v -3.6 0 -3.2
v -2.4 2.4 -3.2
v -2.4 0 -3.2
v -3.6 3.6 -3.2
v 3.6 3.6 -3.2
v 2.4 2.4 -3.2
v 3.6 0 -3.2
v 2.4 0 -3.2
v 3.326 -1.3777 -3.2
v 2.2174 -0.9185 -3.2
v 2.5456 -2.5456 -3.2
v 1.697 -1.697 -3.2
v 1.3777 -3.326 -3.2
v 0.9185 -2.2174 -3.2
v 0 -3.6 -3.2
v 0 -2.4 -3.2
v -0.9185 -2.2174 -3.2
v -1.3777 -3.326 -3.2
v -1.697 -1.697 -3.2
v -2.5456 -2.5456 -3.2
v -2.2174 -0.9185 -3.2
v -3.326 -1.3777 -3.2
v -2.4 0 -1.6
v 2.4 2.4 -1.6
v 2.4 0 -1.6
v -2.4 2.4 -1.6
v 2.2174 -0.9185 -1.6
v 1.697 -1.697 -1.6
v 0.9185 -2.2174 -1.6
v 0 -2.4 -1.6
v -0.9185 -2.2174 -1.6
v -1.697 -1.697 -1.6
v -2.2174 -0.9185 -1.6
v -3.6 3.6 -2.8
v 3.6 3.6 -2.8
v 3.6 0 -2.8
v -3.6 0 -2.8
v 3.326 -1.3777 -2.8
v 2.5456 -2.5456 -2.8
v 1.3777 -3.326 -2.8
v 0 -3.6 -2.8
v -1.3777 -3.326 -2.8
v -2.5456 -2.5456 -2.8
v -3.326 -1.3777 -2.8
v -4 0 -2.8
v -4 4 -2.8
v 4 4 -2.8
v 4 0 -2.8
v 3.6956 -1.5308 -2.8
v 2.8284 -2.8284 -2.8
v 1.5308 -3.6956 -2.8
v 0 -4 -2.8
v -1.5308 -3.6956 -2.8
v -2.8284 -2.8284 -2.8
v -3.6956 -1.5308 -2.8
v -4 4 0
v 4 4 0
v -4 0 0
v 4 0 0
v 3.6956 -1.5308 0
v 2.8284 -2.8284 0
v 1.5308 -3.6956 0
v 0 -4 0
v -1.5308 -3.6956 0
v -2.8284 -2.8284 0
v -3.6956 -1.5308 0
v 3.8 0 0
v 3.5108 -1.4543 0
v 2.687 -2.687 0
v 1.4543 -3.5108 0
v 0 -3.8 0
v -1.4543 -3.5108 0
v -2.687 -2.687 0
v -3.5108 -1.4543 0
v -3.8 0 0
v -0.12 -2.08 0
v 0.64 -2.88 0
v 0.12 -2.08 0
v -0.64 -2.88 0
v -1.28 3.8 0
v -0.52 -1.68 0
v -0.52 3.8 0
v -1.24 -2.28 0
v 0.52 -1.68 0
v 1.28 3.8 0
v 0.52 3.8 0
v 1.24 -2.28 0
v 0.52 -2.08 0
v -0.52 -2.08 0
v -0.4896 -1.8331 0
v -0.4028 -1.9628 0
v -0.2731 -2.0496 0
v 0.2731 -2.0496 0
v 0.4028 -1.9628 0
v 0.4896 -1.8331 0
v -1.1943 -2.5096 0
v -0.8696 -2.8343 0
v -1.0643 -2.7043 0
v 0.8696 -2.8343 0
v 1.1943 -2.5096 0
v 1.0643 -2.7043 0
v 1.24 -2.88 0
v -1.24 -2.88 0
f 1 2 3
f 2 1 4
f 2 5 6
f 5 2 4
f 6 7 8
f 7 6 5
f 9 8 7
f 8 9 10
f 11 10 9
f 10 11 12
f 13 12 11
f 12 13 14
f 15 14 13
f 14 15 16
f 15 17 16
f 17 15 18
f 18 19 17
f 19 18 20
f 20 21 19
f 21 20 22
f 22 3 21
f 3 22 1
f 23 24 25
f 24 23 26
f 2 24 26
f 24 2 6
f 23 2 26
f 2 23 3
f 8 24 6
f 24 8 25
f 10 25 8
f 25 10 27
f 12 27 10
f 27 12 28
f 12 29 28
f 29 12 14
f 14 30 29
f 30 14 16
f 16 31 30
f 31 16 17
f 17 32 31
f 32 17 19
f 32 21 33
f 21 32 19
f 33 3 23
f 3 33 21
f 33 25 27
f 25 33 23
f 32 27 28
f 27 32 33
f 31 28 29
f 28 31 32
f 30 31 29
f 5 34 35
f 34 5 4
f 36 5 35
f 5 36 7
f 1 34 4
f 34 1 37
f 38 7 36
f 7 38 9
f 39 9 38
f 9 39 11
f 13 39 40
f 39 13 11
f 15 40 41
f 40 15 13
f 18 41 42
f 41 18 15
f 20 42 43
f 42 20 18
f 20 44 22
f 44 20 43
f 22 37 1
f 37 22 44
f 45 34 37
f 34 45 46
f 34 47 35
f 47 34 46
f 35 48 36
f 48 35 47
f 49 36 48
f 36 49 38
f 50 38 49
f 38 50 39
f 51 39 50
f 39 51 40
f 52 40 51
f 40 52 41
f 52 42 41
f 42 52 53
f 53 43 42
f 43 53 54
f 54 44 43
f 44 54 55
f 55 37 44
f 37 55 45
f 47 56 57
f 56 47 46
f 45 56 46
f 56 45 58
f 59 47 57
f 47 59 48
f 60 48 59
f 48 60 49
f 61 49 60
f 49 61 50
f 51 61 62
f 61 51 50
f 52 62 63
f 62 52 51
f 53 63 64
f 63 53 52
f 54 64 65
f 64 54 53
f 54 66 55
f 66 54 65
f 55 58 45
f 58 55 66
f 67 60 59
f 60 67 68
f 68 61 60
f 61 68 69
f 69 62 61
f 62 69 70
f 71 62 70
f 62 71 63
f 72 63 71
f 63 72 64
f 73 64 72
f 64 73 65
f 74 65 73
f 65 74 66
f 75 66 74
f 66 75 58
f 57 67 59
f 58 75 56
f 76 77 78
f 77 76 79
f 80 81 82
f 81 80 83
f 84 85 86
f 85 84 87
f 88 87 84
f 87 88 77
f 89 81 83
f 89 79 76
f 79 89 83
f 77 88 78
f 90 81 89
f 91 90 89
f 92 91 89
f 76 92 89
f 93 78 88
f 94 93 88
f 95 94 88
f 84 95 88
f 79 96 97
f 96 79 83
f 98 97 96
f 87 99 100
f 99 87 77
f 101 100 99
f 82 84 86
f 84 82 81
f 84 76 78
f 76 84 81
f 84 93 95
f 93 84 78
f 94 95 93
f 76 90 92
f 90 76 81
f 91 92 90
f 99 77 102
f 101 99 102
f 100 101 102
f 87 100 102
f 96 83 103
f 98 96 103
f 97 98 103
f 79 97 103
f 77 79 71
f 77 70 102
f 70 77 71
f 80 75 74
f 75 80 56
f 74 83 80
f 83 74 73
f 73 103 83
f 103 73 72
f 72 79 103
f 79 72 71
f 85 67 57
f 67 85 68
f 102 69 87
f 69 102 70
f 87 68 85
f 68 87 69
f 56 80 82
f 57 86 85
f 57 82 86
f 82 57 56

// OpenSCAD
// file: ../p/2-4edge.scad
use <../lib.scad>
function ldraw_lib__2_4edge() = [
// 0 Circle 0.5
// 0 Name: 2-4edge.dat
// 0 Author: James Jessiman
// 0 !LDRAW_ORG Primitive UPDATE 2017-01
// 0 !LICENSE Licensed under CC BY 4.0 : see CAreadme.txt
// 
// 0 BFC CERTIFY CCW
  [0,"BFC","CERTIFY"],
  [0,"BFC","CCW"],
// 
// 0 !HISTORY 2007-06-24 [PTadmin] Header formatted for Contributor Agreement
// 0 !HISTORY 2008-07-01 [PTadmin] Official Update 2008-01
// 0 !HISTORY 2017-01-15 [Steffen] BFCed
// 0 !HISTORY 2017-12-30 [PTadmin] Official Update 2017-01
// 
// 
// 2 24 1 0 0 0.9239 0 0.3827
  [2,24,1,0,0,0.9239,0,0.3827],
// 2 24 0.9239 0 0.3827 0.7071 0 0.7071
  [2,24,0.9239,0,0.3827,0.7071,0,0.7071],
// 2 24 0.7071 0 0.7071 0.3827 0 0.9239
  [2,24,0.7071,0,0.7071,0.3827,0,0.9239],
// 2 24 0.3827 0 0.9239 0 0 1
  [2,24,0.3827,0,0.9239,0,0,1],
// 2 24 0 0 1 -0.3827 0 0.9239
  [2,24,0,0,1,-0.3827,0,0.9239],
// 2 24 -0.3827 0 0.9239 -0.7071 0 0.7071
  [2,24,-0.3827,0,0.9239,-0.7071,0,0.7071],
// 2 24 -0.7071 0 0.7071 -0.9239 0 0.3827
  [2,24,-0.7071,0,0.7071,-0.9239,0,0.3827],
// 2 24 -0.9239 0 0.3827 -1 0 0
  [2,24,-0.9239,0,0.3827,-1,0,0],
];
module ldraw_lib__2_4edge(step=0, col=false, unit=2/5, alt=false, line=0.2, solid=!$preview)
    makepoly(ldraw_lib__2_4edge(), step=step, col=col, unit=unit, alt=alt, line=line, solid=solid);
ldraw_lib__2_4edge(line=0.2);
// file: ../p/2-4cyli.scad
use <../lib.scad>
function ldraw_lib__2_4cyli() = [
// 0 Cylinder 0.5
// 0 Name: 2-4cyli.dat
// 0 Author: James Jessiman
// 0 !LDRAW_ORG Primitive UPDATE 2005-01
// 0 !LICENSE Licensed under CC BY 2.0 and CC BY 4.0 : see CAreadme.txt
// 
// 0 BFC CERTIFY CCW
  [0,"BFC","CERTIFY"],
  [0,"BFC","CCW"],
// 
// 0 !HISTORY 2002-03-23 [sbliss] Added BFC statement; compacted code
// 0 !HISTORY 2002-04-25 [PTadmin] Official Update 2002-02
// 0 !HISTORY 2004-12-11 [nielsk] Recreated using Primitive Generator, Edge lines fixed, BFC changed to CCW
// 0 !HISTORY 2005-12-28 [PTadmin] Official Update 2005-01
// 0 !HISTORY 2007-06-24 [PTadmin] Header formatted for Contributor Agreement
// 0 !HISTORY 2008-07-01 [PTadmin] Official Update 2008-01
// 
// 
// 4 16 .9239 1 .3827 .9239 0 .3827 1 0 0 1 1 0
  [4,16,.9239,1,.3827,.9239,0,.3827,1,0,0,1,1,0],
// 4 16 .7071 1 .7071 .7071 0 .7071 .9239 0 .3827 .9239 1 .3827
  [4,16,.7071,1,.7071,.7071,0,.7071,.9239,0,.3827,.9239,1,.3827],
// 4 16 .3827 1 .9239 .3827 0 .9239 .7071 0 .7071 .7071 1 .7071
  [4,16,.3827,1,.9239,.3827,0,.9239,.7071,0,.7071,.7071,1,.7071],
// 4 16 0 1 1 0 0 1 .3827 0 .9239 .3827 1 .9239
  [4,16,0,1,1,0,0,1,.3827,0,.9239,.3827,1,.9239],
// 4 16 -.3827 1 .9239 -.3827 0 .9239 0 0 1 0 1 1
  [4,16,-.3827,1,.9239,-.3827,0,.9239,0,0,1,0,1,1],
// 4 16 -.7071 1 .7071 -.7071 0 .7071 -.3827 0 .9239 -.3827 1 .9239
  [4,16,-.7071,1,.7071,-.7071,0,.7071,-.3827,0,.9239,-.3827,1,.9239],
// 4 16 -.9239 1 .3827 -.9239 0 .3827 -.7071 0 .7071 -.7071 1 .7071
  [4,16,-.9239,1,.3827,-.9239,0,.3827,-.7071,0,.7071,-.7071,1,.7071],
// 4 16 -1 1 0 -1 0 0 -.9239 0 .3827 -.9239 1 .3827
  [4,16,-1,1,0,-1,0,0,-.9239,0,.3827,-.9239,1,.3827],
// 5 24 1 1 0 1 0 0 1 1 -.4142 .9239 1 .3827
  [5,24,1,1,0,1,0,0,1,1,-.4142,.9239,1,.3827],
// 5 24 .9239 1 .3827 .9239 0 .3827 1 1 0 .7071 1 .7071
  [5,24,.9239,1,.3827,.9239,0,.3827,1,1,0,.7071,1,.7071],
// 5 24 .7071 1 .7071 .7071 0 .7071 .9239 1 .3827 .3827 1 .9239
  [5,24,.7071,1,.7071,.7071,0,.7071,.9239,1,.3827,.3827,1,.9239],
// 5 24 .3827 1 .9239 .3827 0 .9239 .7071 1 .7071 0 1 1
  [5,24,.3827,1,.9239,.3827,0,.9239,.7071,1,.7071,0,1,1],
// 5 24 0 1 1 0 0 1 .3827 1 .9239 -.3827 1 .9239
  [5,24,0,1,1,0,0,1,.3827,1,.9239,-.3827,1,.9239],
// 5 24 -.3827 1 .9239 -.3827 0 .9239 0 1 1 -.7071 1 .7071
  [5,24,-.3827,1,.9239,-.3827,0,.9239,0,1,1,-.7071,1,.7071],
// 5 24 -.7071 1 .7071 -.7071 0 .7071 -.3827 1 .9239 -.9239 1 .3827
  [5,24,-.7071,1,.7071,-.7071,0,.7071,-.3827,1,.9239,-.9239,1,.3827],
// 5 24 -.9239 1 .3827 -.9239 0 .3827 -.7071 1 .7071 -1 1 0
  [5,24,-.9239,1,.3827,-.9239,0,.3827,-.7071,1,.7071,-1,1,0],
// 5 24 -1 1 0 -1 0 0 -.9239 1 .3827 -1 1 -.4142
  [5,24,-1,1,0,-1,0,0,-.9239,1,.3827,-1,1,-.4142],
// 0
];
module ldraw_lib__2_4cyli(step=0, col=false, unit=2/5, alt=false, line=0.2, solid=!$preview)
    makepoly(ldraw_lib__2_4cyli(), step=step, col=col, unit=unit, alt=alt, line=line, solid=solid);
ldraw_lib__2_4cyli(line=0.2);
// file: ../p/box4-4a.scad
use <../lib.scad>
function ldraw_lib__box4_4a() = [
// 0 Box with 4 Faces without 4 Adjacent Edges
// 0 Name: box4-4a.dat
// 0 Author: Manfred Moolhuysen
// 0 !LDRAW_ORG Primitive UPDATE 2012-01
// 0 !LICENSE Licensed under CC BY 2.0 and CC BY 4.0 : see CAreadme.txt
// 
// 0 BFC CERTIFY CCW
  [0,"BFC","CERTIFY"],
  [0,"BFC","CCW"],
// 
// 0 !HISTORY 1998-07-15 [PTadmin] Official Update 1998-07
// 0 !HISTORY 2002-12-13 [hafhead] Made BFC compliant
// 0 !HISTORY 2003-03-12 [PTadmin] Official Update 2003-01
// 0 !HISTORY 2007-06-24 [PTadmin] Header formatted for Contributor Agreement
// 0 !HISTORY 2008-07-01 [PTadmin] Official Update 2008-01
// 0 !HISTORY 2012-02-16 [Philo] Changed to CCW
// 0 !HISTORY 2012-03-30 [PTadmin] Official Update 2012-01
// 
// 
// 2 24 1 1 1 -1 1 1
  [2,24,1,1,1,-1,1,1],
// 2 24 -1 1 1 -1 1 -1
  [2,24,-1,1,1,-1,1,-1],
// 2 24 1 1 -1 1 1 1
  [2,24,1,1,-1,1,1,1],
// 2 24 1 0 1 -1 0 1
  [2,24,1,0,1,-1,0,1],
// 2 24 -1 0 1 -1 0 -1
  [2,24,-1,0,1,-1,0,-1],
// 2 24 1 0 -1 1 0 1
  [2,24,1,0,-1,1,0,1],
// 2 24 1 0 1 1 1 1
  [2,24,1,0,1,1,1,1],
// 2 24 -1 0 1 -1 1 1
  [2,24,-1,0,1,-1,1,1],
// 4 16 1 1 -1 -1 1 -1 -1 1 1 1 1 1
  [4,16,1,1,-1,-1,1,-1,-1,1,1,1,1,1],
// 4 16 -1 1 1 -1 0 1 1 0 1 1 1 1
  [4,16,-1,1,1,-1,0,1,1,0,1,1,1,1],
// 4 16 -1 1 -1 -1 0 -1 -1 0 1 -1 1 1
  [4,16,-1,1,-1,-1,0,-1,-1,0,1,-1,1,1],
// 4 16 1 1 1 1 0 1 1 0 -1 1 1 -1
  [4,16,1,1,1,1,0,1,1,0,-1,1,1,-1],
];
module ldraw_lib__box4_4a(step=0, col=false, unit=2/5, alt=false, line=0.2, solid=!$preview)
    makepoly(ldraw_lib__box4_4a(), step=step, col=col, unit=unit, alt=alt, line=line, solid=solid);
ldraw_lib__box4_4a(line=0.2);
// file: ../p/box3u4a.scad
use <../lib.scad>
function ldraw_lib__box3u4a() = [
// 0 Box with 3 Faces without 4 Adjacent Edges
// 0 Name: box3u4a.dat
// 0 Author: Niels Karsdorp [nielsk]
// 0 !LDRAW_ORG Primitive UPDATE 2009-01
// 0 !LICENSE Licensed under CC BY 2.0 and CC BY 4.0 : see CAreadme.txt
// 
// 0 BFC CERTIFY CCW
  [0,"BFC","CERTIFY"],
  [0,"BFC","CCW"],
// 
// 0 !HISTORY 2009-05-02 [PTadmin] Official Update 2009-01
// 
// 
// 2 24 1 1 1 -1 1 1
  [2,24,1,1,1,-1,1,1],
// 2 24 -1 1 -1 1 1 -1
  [2,24,-1,1,-1,1,1,-1],
// 2 24 1 1 1 1 1 -1
  [2,24,1,1,1,1,1,-1],
// 2 24 -1 1 1 -1 1 -1
  [2,24,-1,1,1,-1,1,-1],
// 2 24 1 1 1 1 0 1
  [2,24,1,1,1,1,0,1],
// 2 24 1 1 -1 1 0 -1
  [2,24,1,1,-1,1,0,-1],
// 2 24 -1 1 1 -1 0 1
  [2,24,-1,1,1,-1,0,1],
// 2 24 -1 1 -1 -1 0 -1
  [2,24,-1,1,-1,-1,0,-1],
// 4 16 -1 1 -1 -1 1 1 1 1 1 1 1 -1
  [4,16,-1,1,-1,-1,1,1,1,1,1,1,1,-1],
// 4 16 -1 1 1 -1 0 1 1 0 1 1 1 1
  [4,16,-1,1,1,-1,0,1,1,0,1,1,1,1],
// 4 16 1 1 -1 1 0 -1 -1 0 -1 -1 1 -1
  [4,16,1,1,-1,1,0,-1,-1,0,-1,-1,1,-1],
// 0
];
module ldraw_lib__box3u4a(step=0, col=false, unit=2/5, alt=false, line=0.2, solid=!$preview)
    makepoly(ldraw_lib__box3u4a(), step=step, col=col, unit=unit, alt=alt, line=line, solid=solid);
ldraw_lib__box3u4a(line=0.2);
// file: ../p/2-4ring9.scad
use <../lib.scad>
function ldraw_lib__2_4ring9() = [
// 0 Ring  9 x 0.5
// 0 Name: 2-4ring9.dat
// 0 Author: Guy Vivan [guyvivan]
// 0 !LDRAW_ORG Primitive UPDATE 2009-02
// 0 !LICENSE Licensed under CC BY 2.0 and CC BY 4.0 : see CAreadme.txt
// 
// 0 BFC CERTIFY CCW
  [0,"BFC","CERTIFY"],
  [0,"BFC","CCW"],
// 
// 0 !HISTORY 2009-09-03 [PTadmin] Official Update 2009-02
// 
// 
// 4 16 9 0 0 10 0 0 9.239 0 3.827 8.3151 0 3.4443
  [4,16,9,0,0,10,0,0,9.239,0,3.827,8.3151,0,3.4443],
// 4 16 8.3151 0 3.4443 9.239 0 3.827 7.071 0 7.071 6.3639 0 6.3639
  [4,16,8.3151,0,3.4443,9.239,0,3.827,7.071,0,7.071,6.3639,0,6.3639],
// 4 16 6.3639 0 6.3639 7.071 0 7.071 3.827 0 9.239 3.4443 0 8.3151
  [4,16,6.3639,0,6.3639,7.071,0,7.071,3.827,0,9.239,3.4443,0,8.3151],
// 4 16 3.4443 0 8.3151 3.827 0 9.239 0 0 10 0 0 9
  [4,16,3.4443,0,8.3151,3.827,0,9.239,0,0,10,0,0,9],
// 4 16 0 0 9 0 0 10 -3.827 0 9.239 -3.4443 0 8.3151
  [4,16,0,0,9,0,0,10,-3.827,0,9.239,-3.4443,0,8.3151],
// 4 16 -3.4443 0 8.3151 -3.827 0 9.239 -7.071 0 7.071 -6.3639 0 6.3639
  [4,16,-3.4443,0,8.3151,-3.827,0,9.239,-7.071,0,7.071,-6.3639,0,6.3639],
// 4 16 -6.3639 0 6.3639 -7.071 0 7.071 -9.239 0 3.827 -8.3151 0 3.4443
  [4,16,-6.3639,0,6.3639,-7.071,0,7.071,-9.239,0,3.827,-8.3151,0,3.4443],
// 4 16 -8.3151 0 3.4443 -9.239 0 3.827 -10 0 0 -9 0 0
  [4,16,-8.3151,0,3.4443,-9.239,0,3.827,-10,0,0,-9,0,0],
// 
// 0 end of file
// 
];
module ldraw_lib__2_4ring9(step=0, col=false, unit=2/5, alt=false, line=0.2, solid=!$preview)
    makepoly(ldraw_lib__2_4ring9(), step=step, col=col, unit=unit, alt=alt, line=line, solid=solid);
ldraw_lib__2_4ring9(line=0.2);
// file: ../p/2-4ring2.scad
use <../lib.scad>
function ldraw_lib__2_4ring2() = [
// 0 Ring  2 x 0.5
// 0 Name: 2-4ring2.dat
// 0 Author: Chris Dee [cwdee]
// 0 !LDRAW_ORG Primitive UPDATE 2012-01
// 0 !LICENSE Licensed under CC BY 4.0 : see CAreadme.txt
// 
// 0 BFC CERTIFY CCW
  [0,"BFC","CERTIFY"],
  [0,"BFC","CCW"],
// 
// 0 !HISTORY 2001-10-26 [PTadmin] Official Update 2001-01
// 0 !HISTORY 2007-06-24 [PTadmin] Header formatted for Contributor Agreement
// 0 !HISTORY 2008-07-01 [PTadmin] Official Update 2008-01
// 0 !HISTORY 2012-02-16 [Philo] Changed to CCW
// 0 !HISTORY 2012-03-30 [PTadmin] Official Update 2012-01
// 
// 
// 4 16 3 0 0 2.7717 0 1.1481 1.8478 0 0.7654 2 0 0
  [4,16,3,0,0,2.7717,0,1.1481,1.8478,0,0.7654,2,0,0],
// 4 16 2.7717 0 1.1481 2.1213 0 2.1213 1.4142 0 1.4142 1.8478 0 0.7654
  [4,16,2.7717,0,1.1481,2.1213,0,2.1213,1.4142,0,1.4142,1.8478,0,0.7654],
// 4 16 2.1213 0 2.1213 1.1481 0 2.7717 0.7654 0 1.8478 1.4142 0 1.4142
  [4,16,2.1213,0,2.1213,1.1481,0,2.7717,0.7654,0,1.8478,1.4142,0,1.4142],
// 4 16 1.1481 0 2.7717 0 0 3 0 0 2 0.7654 0 1.8478
  [4,16,1.1481,0,2.7717,0,0,3,0,0,2,0.7654,0,1.8478],
// 4 16 0 0 3 -1.1481 0 2.7717 -0.7654 0 1.8478 0 0 2
  [4,16,0,0,3,-1.1481,0,2.7717,-0.7654,0,1.8478,0,0,2],
// 4 16 -1.1481 0 2.7717 -2.1213 0 2.1213 -1.4142 0 1.4142 -0.7654 0 1.8478
  [4,16,-1.1481,0,2.7717,-2.1213,0,2.1213,-1.4142,0,1.4142,-0.7654,0,1.8478],
// 4 16 -2.1213 0 2.1213 -2.7717 0 1.1481 -1.8478 0 0.7654 -1.4142 0 1.4142
  [4,16,-2.1213,0,2.1213,-2.7717,0,1.1481,-1.8478,0,0.7654,-1.4142,0,1.4142],
// 4 16 -2.7717 0 1.1481 -3 0 0 -2 0 0 -1.8478 0 0.7654
  [4,16,-2.7717,0,1.1481,-3,0,0,-2,0,0,-1.8478,0,0.7654],
];
module ldraw_lib__2_4ring2(step=0, col=false, unit=2/5, alt=false, line=0.2, solid=!$preview)
    makepoly(ldraw_lib__2_4ring2(), step=step, col=col, unit=unit, alt=alt, line=line, solid=solid);
ldraw_lib__2_4ring2(line=0.2);
// file: ../p/2-4cylo.scad
use <../lib.scad>
use <2-4cyli.scad>
use <2-4edge.scad>
function ldraw_lib__2_4cylo() = [
// 0 Cylinder Open 0.5
// 0 Name: 2-4cylo.dat
// 0 Author: Max Martin Richter [MMR1988]
// 0 !LDRAW_ORG Primitive UPDATE 2010-03
// 0 !LICENSE Licensed under CC BY 4.0 : see CAreadme.txt
// 
// 0 BFC CERTIFY CCW
  [0,"BFC","CERTIFY"],
  [0,"BFC","CCW"],
// 
// 0 !HISTORY 2010-12-31 [PTadmin] Official Update 2010-03
// 
// 
// 1 16 0 0 0 1 0 0 0 1 0 0 0 1 2-4edge.dat
  [1,16,0,0,0,1,0,0,0,1,0,0,0,1, ldraw_lib__2_4edge()],
// 1 16 0 1 0 1 0 0 0 1 0 0 0 1 2-4edge.dat
  [1,16,0,1,0,1,0,0,0,1,0,0,0,1, ldraw_lib__2_4edge()],
// 1 16 0 0 0 1 0 0 0 1 0 0 0 1 2-4cyli.dat
  [1,16,0,0,0,1,0,0,0,1,0,0,0,1, ldraw_lib__2_4cyli()],
];
module ldraw_lib__2_4cylo(step=0, col=false, unit=2/5, alt=false, line=0.2, solid=!$preview)
    makepoly(ldraw_lib__2_4cylo(), step=step, col=col, unit=unit, alt=alt, line=line, solid=solid);
ldraw_lib__2_4cylo(line=0.2);
// file: ../p/2-4chrd.scad
use <../lib.scad>
function ldraw_lib__2_4chrd() = [
// 0 Chord 0.5
// 0 Name: 2-4chrd.dat
// 0 Author: Philippe Hurbain [Philo]
// 0 !LDRAW_ORG Primitive UPDATE 2014-01
// 0 !LICENSE Licensed under CC BY 4.0 : see CAreadme.txt
// 
// 0 BFC CERTIFY CCW
  [0,"BFC","CERTIFY"],
  [0,"BFC","CCW"],
// 
// 0 !HISTORY 2014-06-21 [PTadmin] Official Update 2014-01
// 
// 
// 4 16 0.9239 0 0.3827 -0.9239 0 0.3827 -1 0 0 1 0 0
  [4,16,0.9239,0,0.3827,-0.9239,0,0.3827,-1,0,0,1,0,0],
// 4 16 0.7071 0 0.7071 -0.7071 0 0.7071 -0.9239 0 0.3827 0.9239 0 0.3827
  [4,16,0.7071,0,0.7071,-0.7071,0,0.7071,-0.9239,0,0.3827,0.9239,0,0.3827],
// 4 16 0.3827 0 0.9239 -0.3827 0 0.9239 -0.7071 0 0.7071 0.7071 0 0.7071
  [4,16,0.3827,0,0.9239,-0.3827,0,0.9239,-0.7071,0,0.7071,0.7071,0,0.7071],
// 3 16 0 0 1 -0.3827 0 0.9239 0.3827 0 0.9239
  [3,16,0,0,1,-0.3827,0,0.9239,0.3827,0,0.9239],
];
module ldraw_lib__2_4chrd(step=0, col=false, unit=2/5, alt=false, line=0.2, solid=!$preview)
    makepoly(ldraw_lib__2_4chrd(), step=step, col=col, unit=unit, alt=alt, line=line, solid=solid);
ldraw_lib__2_4chrd(line=0.2);
// file: ../p/empty.scad
use <../lib.scad>
function ldraw_lib__empty() = [
// 0 Empty
// 0 Name: empty.dat
// 0 Author: Steffen [Steffen]
// 0 !LDRAW_ORG Primitive UPDATE 2015-01
// 0 !LICENSE Licensed under CC BY 4.0 : see CAreadme.txt
// 
// 0 BFC CERTIFY CCW
  [0,"BFC","CERTIFY"],
  [0,"BFC","CCW"],
// 
// 0 !HISTORY 2015-10-11 [PTadmin] Official Update 2015-01
// 
// 
// 0 // Tool MLCad cannot handle really empty files. This file is used as a workaround.
// 0 // It exceptionally contains forbidden non-LDRAW standard syntax to satisfy MLCad until it is fixed OR a different editor has become the de-facto LDRAW standard.
// 0 // The line being used here is an "impossible" conditional line which never should be visible,
// 0 // additionally hidden by a syntax explicitly hiding it from displaying.
// 
// 0 MLCAD HIDE 5 24 0 0 0 0.0001 0 0 0.0001 -0.0001 0 0 0 0
];
module ldraw_lib__empty(step=0, col=false, unit=2/5, alt=false, line=0.2, solid=!$preview)
    makepoly(ldraw_lib__empty(), step=step, col=col, unit=unit, alt=alt, line=line, solid=solid);
ldraw_lib__empty(line=0.2);
// file: s/24246s02.scad
use <../../lib.scad>
use <../../p/2-4chrd.scad>
use <../../p/2-4cylo.scad>
use <../../p/2-4ring2.scad>
use <../../p/2-4ring9.scad>
use <../../p/box3u4a.scad>
use <../../p/box4-4a.scad>
function ldraw_lib__s__24246s02() = [
// 0 ~Tile  1 x  1 with Rounded End without Complete Top Face
// 0 Name: s\24246s02.dat
// 0 Author: Magnus Forsberg [MagFors]
// 0 !LDRAW_ORG Subpart UPDATE 2020-02
// 0 !LICENSE Licensed under CC BY 4.0 : see CAreadme.txt
// 
// 0 BFC CERTIFY CCW
  [0,"BFC","CERTIFY"],
  [0,"BFC","CCW"],
// 
// 0 !HISTORY 2020-09-05 [PTadmin] Official Update 2020-02
// 
// 
// 4 16 -9 8 0 -9 8 9 -6 8 6 -6 8 0
  [4,16,-9,8,0,-9,8,9,-6,8,6,-6,8,0],
// 4 16 -9 8 9 9 8 9 6 8 6 -6 8 6
  [4,16,-9,8,9,9,8,9,6,8,6,-6,8,6],
// 4 16 9 8 9 9 8 0 6 8 0 6 8 6
  [4,16,9,8,9,9,8,0,6,8,0,6,8,6],
// 1 16 0 8 0 3 0 0 0 -1 0 0 0 -3 2-4ring2.dat
  [1,16,0,8,0,3,0,0,0,-1,0,0,0,-3, ldraw_lib__2_4ring2()],
// 0 BFC INVERTNEXT
  [0,"BFC","INVERTNEXT"],
// 1 16 0 8 3 6 0 0 0 -4 0 0 0 3 box4-4a.dat
  [1,16,0,8,3,6,0,0,0,-4,0,0,0,3, ldraw_lib__box4_4a()],
// 0 BFC INVERTNEXT
  [0,"BFC","INVERTNEXT"],
// 1 16 0 4 0 6 0 0 0 4 0 0 0 -6 2-4cylo.dat
  [1,16,0,4,0,6,0,0,0,4,0,0,0,-6, ldraw_lib__2_4cylo()],
// 1 16 0 4 0 6 0 0 0 -4 0 0 0 -6 2-4chrd.dat
  [1,16,0,4,0,6,0,0,0,-4,0,0,0,-6, ldraw_lib__2_4chrd()],
// 1 16 0 7.5 0 0 0 9 0.5 0 0 0 9 0 box3u4a.dat
  [1,16,0,7.5,0,0,0,9,0.5,0,0,0,9,0, ldraw_lib__box3u4a()],
// 1 16 0 7 0 9 0 0 0 1 0 0 0 -9 2-4cylo.dat
  [1,16,0,7,0,9,0,0,0,1,0,0,0,-9, ldraw_lib__2_4cylo()],
// 4 16 -10 7 0 -10 7 10 -9 7 9 -9 7 0
  [4,16,-10,7,0,-10,7,10,-9,7,9,-9,7,0],
// 4 16 -10 7 10 10 7 10 9 7 9 -9 7 9
  [4,16,-10,7,10,10,7,10,9,7,9,-9,7,9],
// 4 16 10 7 10 10 7 0 9 7 0 9 7 9
  [4,16,10,7,10,10,7,0,9,7,0,9,7,9],
// 1 16 0 7 0 1 0 0 0 -1 0 0 0 -1 2-4ring9.dat
  [1,16,0,7,0,1,0,0,0,-1,0,0,0,-1, ldraw_lib__2_4ring9()],
// 1 16 0 3.5 0 0 0 -10 -3.5 0 0 0 10 0 box3u4a.dat
  [1,16,0,3.5,0,0,0,-10,-3.5,0,0,0,10,0, ldraw_lib__box3u4a()],
// 1 16 0 0 0 10 0 0 0 7 0 0 0 -10 2-4cylo.dat
  [1,16,0,0,0,10,0,0,0,7,0,0,0,-10, ldraw_lib__2_4cylo()],
];
module ldraw_lib__s__24246s02(step=0, col=false, unit=2/5, alt=false, line=0.2, solid=!$preview)
    makepoly(ldraw_lib__s__24246s02(), step=step, col=col, unit=unit, alt=alt, line=line, solid=solid);
ldraw_lib__s__24246s02(line=0.2);
// file: ../p/2-4ring19.scad
use <../lib.scad>
function ldraw_lib__2_4ring19() = [
// 0 Ring 19 x 0.5
// 0 Name: 2-4ring19.dat
// 0 Author: Kevin Roach [KROACH]
// 0 !LDRAW_ORG Primitive UPDATE 2016-01
// 0 !LICENSE Licensed under CC BY 2.0 and CC BY 4.0 : see CAreadme.txt
// 
// 0 BFC CERTIFY CCW
  [0,"BFC","CERTIFY"],
  [0,"BFC","CCW"],
// 
// 0 !HISTORY 2016-12-31 [PTadmin] Official Update 2016-01
// 
// 
// 4 16 20 0 0 18.478 0 7.654 17.5541 0 7.2713 19 0 0
  [4,16,20,0,0,18.478,0,7.654,17.5541,0,7.2713,19,0,0],
// 4 16 18.478 0 7.654 14.142 0 14.142 13.4349 0 13.4349 17.5541 0 7.2713
  [4,16,18.478,0,7.654,14.142,0,14.142,13.4349,0,13.4349,17.5541,0,7.2713],
// 4 16 14.142 0 14.142 7.654 0 18.478 7.2713 0 17.5541 13.4349 0 13.4349
  [4,16,14.142,0,14.142,7.654,0,18.478,7.2713,0,17.5541,13.4349,0,13.4349],
// 4 16 7.654 0 18.478 0 0 20 0 0 19 7.2713 0 17.5541
  [4,16,7.654,0,18.478,0,0,20,0,0,19,7.2713,0,17.5541],
// 4 16 0 0 20 -7.654 0 18.478 -7.2713 0 17.5541 0 0 19
  [4,16,0,0,20,-7.654,0,18.478,-7.2713,0,17.5541,0,0,19],
// 4 16 -7.654 0 18.478 -14.142 0 14.142 -13.4349 0 13.4349 -7.2713 0 17.5541
  [4,16,-7.654,0,18.478,-14.142,0,14.142,-13.4349,0,13.4349,-7.2713,0,17.5541],
// 4 16 -14.142 0 14.142 -18.478 0 7.654 -17.5541 0 7.2713 -13.4349 0 13.4349
  [4,16,-14.142,0,14.142,-18.478,0,7.654,-17.5541,0,7.2713,-13.4349,0,13.4349],
// 4 16 -18.478 0 7.654 -20 0 0 -19 0 0 -17.5541 0 7.2713
  [4,16,-18.478,0,7.654,-20,0,0,-19,0,0,-17.5541,0,7.2713],
// 
];
module ldraw_lib__2_4ring19(step=0, col=false, unit=2/5, alt=false, line=0.2, solid=!$preview)
    makepoly(ldraw_lib__2_4ring19(), step=step, col=col, unit=unit, alt=alt, line=line, solid=solid);
ldraw_lib__2_4ring19(line=0.2);
// file: ../p/1-16chrd.scad
use <../lib.scad>
use <empty.scad>
function ldraw_lib__1_16chrd() = [
// 0 Chord 0.0625
// 0 Name: 1-16chrd.dat
// 0 Author: Philippe Hurbain [Philo]
// 0 !LDRAW_ORG Primitive UPDATE 2015-01
// 0 !LICENSE Licensed under CC BY 4.0 : see CAreadme.txt
// 
// 0 BFC CERTIFY CCW
  [0,"BFC","CERTIFY"],
  [0,"BFC","CCW"],
// 
// 0 !HISTORY 2015-10-11 [PTadmin] Official Update 2015-01
// 
// 
// 0 // This file is intentionally empty because at the current \P resolution,
// 0 // an 1-16chrd is actually empty. However, this file still is present
// 0 // to allow tools to do primitives substition and fill in a real chrd here,
// 0 // or, if desired, to substitute this with the hi-res 48\1-16chrd.
// 
// 0 // This file is based on an idea by Darats at http://forums.ldraw.org/read.php?19,14500,14500#msg-14500
// 
// 1 16 0 0 0 1 0 0 0 1 0 0 0 1 empty.dat
  [1,16,0,0,0,1,0,0,0,1,0,0,0,1, ldraw_lib__empty()],
];
module ldraw_lib__1_16chrd(step=0, col=false, unit=2/5, alt=false, line=0.2, solid=!$preview)
    makepoly(ldraw_lib__1_16chrd(), step=step, col=col, unit=unit, alt=alt, line=line, solid=solid);
ldraw_lib__1_16chrd(line=0.2);
// file: s/24246s01.scad
use <../../lib.scad>
use <../../p/2-4ring19.scad>
use <24246s02.scad>
function ldraw_lib__s__24246s01() = [
// 0 ~Tile  1 x  1 with Rounded End with Partial Top Face
// 0 Name: s\24246s01.dat
// 0 Author: Owen Burgoyne [C3POwen]
// 0 !LDRAW_ORG Subpart UPDATE 2020-02
// 0 !LICENSE Licensed under CC BY 2.0 and CC BY 4.0 : see CAreadme.txt
// 
// 0 BFC CERTIFY CCW
  [0,"BFC","CERTIFY"],
  [0,"BFC","CCW"],
// 
// 0 !HISTORY 2016-10-15 [MagFors] smaller topradius
// 0 !HISTORY 2016-12-31 [PTadmin] Official Update 2016-01
// 0 !HISTORY 2019-06-17 [MagFors] Removed topradius
// 0 !HISTORY 2019-07-19 [MagFors] Subfiled without top surface
// 0 !HISTORY 2020-09-05 [PTadmin] Official Update 2020-02
// 
// 
// 1 16 0 0 0 1 0 0 0 1 0 0 0 1 s\24246s02.dat
  [1,16,0,0,0,1,0,0,0,1,0,0,0,1, ldraw_lib__s__24246s02()],
// 1 16 0 0 0 .5 0 0 0 1 0 0 0 -.5 2-4ring19.dat
  [1,16,0,0,0,.5,0,0,0,1,0,0,0,-.5, ldraw_lib__2_4ring19()],
// 3 16 10 0 10 9.5 0 0 10 0 0
  [3,16,10,0,10,9.5,0,0,10,0,0],
// 3 16 -10 0 0 -9.5 0 0 -10 0 10
  [3,16,-10,0,0,-9.5,0,0,-10,0,10],
];
module ldraw_lib__s__24246s01(step=0, col=false, unit=2/5, alt=false, line=0.2, solid=!$preview)
    makepoly(ldraw_lib__s__24246s01(), step=step, col=col, unit=unit, alt=alt, line=line, solid=solid);
ldraw_lib__s__24246s01(line=0.2);
// file: ../p/1-4ndis.scad
use <../lib.scad>
function ldraw_lib__1_4ndis() = [
// 0 Disc Negative 0.25
// 0 Name: 1-4ndis.dat
// 0 Author: James Jessiman
// 0 !LDRAW_ORG Primitive UPDATE 2012-01
// 0 !LICENSE Licensed under CC BY 4.0 : see CAreadme.txt
// 
// 0 BFC CERTIFY CCW
  [0,"BFC","CERTIFY"],
  [0,"BFC","CCW"],
// 
// 0 !HISTORY 2002-03-23 [sbliss] Added BFC Statement
// 0 !HISTORY 2002-04-25 [PTadmin] Official Update 2002-02
// 0 !HISTORY 2007-06-22 [PTadmin] Header formatted for Contributor Agreement
// 0 !HISTORY 2008-07-01 [PTadmin] Official Update 2008-01
// 0 !HISTORY 2012-02-16 [Philo] Changed to CCW
// 0 !HISTORY 2012-03-30 [PTadmin] Official Update 2012-01
// 
// 
// 3 16 0.9239 0 0.3827 1 0 0 1 0 1
  [3,16,0.9239,0,0.3827,1,0,0,1,0,1],
// 3 16 0.7071 0 0.7071 0.9239 0 0.3827 1 0 1
  [3,16,0.7071,0,0.7071,0.9239,0,0.3827,1,0,1],
// 3 16 0.3827 0 0.9239 0.7071 0 0.7071 1 0 1
  [3,16,0.3827,0,0.9239,0.7071,0,0.7071,1,0,1],
// 3 16 0 0 1 0.3827 0 0.9239 1 0 1
  [3,16,0,0,1,0.3827,0,0.9239,1,0,1],
];
module ldraw_lib__1_4ndis(step=0, col=false, unit=2/5, alt=false, line=0.2, solid=!$preview)
    makepoly(ldraw_lib__1_4ndis(), step=step, col=col, unit=unit, alt=alt, line=line, solid=solid);
ldraw_lib__1_4ndis(line=0.2);
// file: ../p/1-4ering.scad
use <../lib.scad>
use <1-16chrd.scad>
function ldraw_lib__1_4ering() = [
// 0 Adapter Ring Triangles to Normal 0.25
// 0 Name: 1-4ering.dat
// 0 Author: Steffen [Steffen]
// 0 !LDRAW_ORG Primitive UPDATE 2015-01
// 0 !LICENSE Licensed under CC BY 4.0 : see CAreadme.txt
// 
// 0 BFC CERTIFY CCW
  [0,"BFC","CERTIFY"],
  [0,"BFC","CCW"],
// 
// 0 !HISTORY 2015-10-11 [PTadmin] Official Update 2015-01
// 
// 
// 0 // This file uses 1-16chrd (actually empty). It allows
// 0 // tools to do primitives substition and fill in a ring of chrd here,
// 0 // or, if desired, to substitute this with the hi-res 48\1-16chrd.
// 0 // This file is based on an idea by Darats at http://forums.ldraw.org/read.php?19,14500,14500#msg-14500
// 
// 1 16 0 0 0 1 0 0 0 1 0 0 0 1 1-16chrd.dat
  [1,16,0,0,0,1,0,0,0,1,0,0,0,1, ldraw_lib__1_16chrd()],
// 1 16 0 0 0 0.38268 0 -0.92388 0 1 0 0.92388 0 0.38268 1-16chrd.dat
  [1,16,0,0,0,0.38268,0,-0.92388,0,1,0,0.92388,0,0.38268, ldraw_lib__1_16chrd()],
// 1 16 0 0 0 0.70711 0 -0.70711 0 1 0 0.70711 0 0.70711 1-16chrd.dat
  [1,16,0,0,0,0.70711,0,-0.70711,0,1,0,0.70711,0,0.70711, ldraw_lib__1_16chrd()],
// 1 16 0 0 0 0.92388 0 -0.38268 0 1 0 0.38268 0 0.92388 1-16chrd.dat
  [1,16,0,0,0,0.92388,0,-0.38268,0,1,0,0.38268,0,0.92388, ldraw_lib__1_16chrd()],
];
module ldraw_lib__1_4ering(step=0, col=false, unit=2/5, alt=false, line=0.2, solid=!$preview)
    makepoly(ldraw_lib__1_4ering(), step=step, col=col, unit=unit, alt=alt, line=line, solid=solid);
ldraw_lib__1_4ering(line=0.2);
// file: ../p/1-4chrd.scad
use <../lib.scad>
function ldraw_lib__1_4chrd() = [
// 0 Chord 0.25
// 0 Name: 1-4chrd.dat
// 0 Author: Tony Hafner [hafhead]
// 0 !LDRAW_ORG Primitive UPDATE 2012-02
// 0 !LICENSE Licensed under CC BY 2.0 and CC BY 4.0 : see CAreadme.txt
// 
// 0 BFC CERTIFY CCW
  [0,"BFC","CERTIFY"],
  [0,"BFC","CCW"],
// 
// 0 !HISTORY 2004-04-22 [PTadmin] Official Update 2004-02
// 0 !HISTORY 2007-10-09 [PTadmin] Header formatted for Contributor Agreement
// 0 !HISTORY 2008-07-01 [PTadmin] Official Update 2008-01
// 0 !HISTORY 2012-08-02 [MMR1988] Re-creation with PrimGen2 and Rectifier
// 0 !HISTORY 2012-08-09 [PTadmin] Official Update 2012-02
// 
// 
// 4 16 0.9239 0 0.3827 0.3827 0 0.9239 0 0 1 1 0 0
  [4,16,0.9239,0,0.3827,0.3827,0,0.9239,0,0,1,1,0,0],
// 3 16 0.7071 0 0.7071 0.3827 0 0.9239 0.9239 0 0.3827
  [3,16,0.7071,0,0.7071,0.3827,0,0.9239,0.9239,0,0.3827],
];
module ldraw_lib__1_4chrd(step=0, col=false, unit=2/5, alt=false, line=0.2, solid=!$preview)
    makepoly(ldraw_lib__1_4chrd(), step=step, col=col, unit=unit, alt=alt, line=line, solid=solid);
ldraw_lib__1_4chrd(line=0.2);
// main file
use <../lib.scad>
use <../p/1-4chrd.scad>
use <../p/1-4ering.scad>
use <../p/1-4ndis.scad>
use <s/24246s01.scad>
function ldraw_lib__24246p02() = [
// 0 Tile  1 x  1 with Rounded End with Red Taillight Pattern
// 0 Name: 24246p02.dat
// 0 Author: Magnus Forsberg [MagFors]
// 0 !LDRAW_ORG Part UPDATE 2019-01
// 0 !LICENSE Licensed under CC BY 4.0 : see CAreadme.txt
// 
// 0 BFC CERTIFY CCW
  [0,"BFC","CERTIFY"],
  [0,"BFC","CCW"],
// 
// 0 !KEYWORDS Bricklink 24246pb002, Challenger, Dodge, set 75893
// 
// 0 !HISTORY 2019-06-28 [PTadmin] Official Update 2019-01
// 
// 
// 1 16 0 0 0 1 0 0 0 1 0 0 0 1 s\24246s01.dat
  [1,16,0,0,0,1,0,0,0,1,0,0,0,1, ldraw_lib__s__24246s01()],
// 4 4 1.6 0 -7.2 0.3 0 -5.2 -0.3 0 -5.2 -1.6 0 -7.2
  [4,4,1.6,0,-7.2,0.3,0,-5.2,-0.3,0,-5.2,-1.6,0,-7.2],
// 4 4 -3.2 0 9.5 -3.1 0 -5.7 -1.3 0 -4.2 -1.3 0 9.5
  [4,4,-3.2,0,9.5,-3.1,0,-5.7,-1.3,0,-4.2,-1.3,0,9.5],
// 4 4 3.2 0 9.5 1.3 0 9.5 1.3 0 -4.2 3.1 0 -5.7
  [4,4,3.2,0,9.5,1.3,0,9.5,1.3,0,-4.2,3.1,0,-5.7],
// 4 4 3.1 0 -5.7 1.3 0 -4.2 1.3 0 -5.2 1.6 0 -7.2
  [4,4,3.1,0,-5.7,1.3,0,-4.2,1.3,0,-5.2,1.6,0,-7.2],
// 3 4 -1.3 0 -5.2 -1.3 0 -4.2 -3.1 0 -5.7
  [3,4,-1.3,0,-5.2,-1.3,0,-4.2,-3.1,0,-5.7],
// 4 4 -1.6 0 -7.2 -0.3 0 -5.2 -1.3 0 -5.2 -3.1 0 -5.7
  [4,4,-1.6,0,-7.2,-0.3,0,-5.2,-1.3,0,-5.2,-3.1,0,-5.7],
// 3 4 1.6 0 -7.2 1.3 0 -5.2 0.3 0 -5.2
  [3,4,1.6,0,-7.2,1.3,0,-5.2,0.3,0,-5.2],
// 1 4 -0.3 0 -4.2 -1 0 0 0 1 0 0 0 -1 1-4ndis.dat
  [1,4,-0.3,0,-4.2,-1,0,0,0,1,0,0,0,-1, ldraw_lib__1_4ndis()],
// 1 4 0.3 0 -4.2 0 0 1 0 1 0 -1 0 0 1-4ndis.dat
  [1,4,0.3,0,-4.2,0,0,1,0,1,0,-1,0,0, ldraw_lib__1_4ndis()],
// 1 4 -1.6 0 -5.7 -1.5 0 0 0 1 0 0 0 -1.5 1-4chrd.dat
  [1,4,-1.6,0,-5.7,-1.5,0,0,0,1,0,0,0,-1.5, ldraw_lib__1_4chrd()],
// 1 4 1.6 0 -5.7 0 0 1.5 0 1 0 -1.5 0 0 1-4chrd.dat
  [1,4,1.6,0,-5.7,0,0,1.5,0,1,0,-1.5,0,0, ldraw_lib__1_4chrd()],
// 4 71 1.3 0 9.5 -1.3 0 9.5 -1.3 0 -4.2 1.3 0 -4.2
  [4,71,1.3,0,9.5,-1.3,0,9.5,-1.3,0,-4.2,1.3,0,-4.2],
// 4 71 -1.3 0 -4.2 -0.3 0 -5.2 0.3 0 -5.2 1.3 0 -4.2
  [4,71,-1.3,0,-4.2,-0.3,0,-5.2,0.3,0,-5.2,1.3,0,-4.2],
// 1 71 0.3 0 -4.2 0 0 1 0 1 0 -1 0 0 1-4chrd.dat
  [1,71,0.3,0,-4.2,0,0,1,0,1,0,-1,0,0, ldraw_lib__1_4chrd()],
// 1 71 -0.3 0 -4.2 -1 0 0 0 1 0 0 0 -1 1-4chrd.dat
  [1,71,-0.3,0,-4.2,-1,0,0,0,1,0,0,0,-1, ldraw_lib__1_4chrd()],
// 1 16 0 0 0 9.5 0 0 0 1 0 0 0 -9.5 1-4ering.dat
  [1,16,0,0,0,9.5,0,0,0,1,0,0,0,-9.5, ldraw_lib__1_4ering()],
// 1 16 0 0 0 0 0 -9.5 0 1 0 -9.5 0 0 1-4ering.dat
  [1,16,0,0,0,0,0,-9.5,0,1,0,-9.5,0,0, ldraw_lib__1_4ering()],
// 1 16 1.6 0 -5.7 0 0 1.5 0 1 0 -1.5 0 0 1-4ndis.dat
  [1,16,1.6,0,-5.7,0,0,1.5,0,1,0,-1.5,0,0, ldraw_lib__1_4ndis()],
// 1 16 -1.6 0 -5.7 -1.5 0 0 0 1 0 0 0 -1.5 1-4ndis.dat
  [1,16,-1.6,0,-5.7,-1.5,0,0,0,1,0,0,0,-1.5, ldraw_lib__1_4ndis()],
// 3 16 1.6 0 -7.2 -1.6 0 -7.2 0 0 -9.5
  [3,16,1.6,0,-7.2,-1.6,0,-7.2,0,0,-9.5],
// 4 16 0 0 -9.5 3.63565 0 -8.77705 3.1 0 -7.2 1.6 0 -7.2
  [4,16,0,0,-9.5,3.63565,0,-8.77705,3.1,0,-7.2,1.6,0,-7.2],
// 4 16 -3.2 0 9.5 -10 0 10 -9.5 0 0 -8.77705 0 -3.63565
  [4,16,-3.2,0,9.5,-10,0,10,-9.5,0,0,-8.77705,0,-3.63565],
// 4 16 -3.1 0 -5.7 -3.2 0 9.5 -8.77705 0 -3.63565 -6.71745 0 -6.71745
  [4,16,-3.1,0,-5.7,-3.2,0,9.5,-8.77705,0,-3.63565,-6.71745,0,-6.71745],
// 4 16 -3.1 0 -7.2 -3.1 0 -5.7 -6.71745 0 -6.71745 -3.63565 0 -8.77705
  [4,16,-3.1,0,-7.2,-3.1,0,-5.7,-6.71745,0,-6.71745,-3.63565,0,-8.77705],
// 4 16 -3.1 0 -7.2 -3.63565 0 -8.77705 0 0 -9.5 -1.6 0 -7.2
  [4,16,-3.1,0,-7.2,-3.63565,0,-8.77705,0,0,-9.5,-1.6,0,-7.2],
// 4 16 9.5 0 0 10 0 10 3.2 0 9.5 8.77705 0 -3.63565
  [4,16,9.5,0,0,10,0,10,3.2,0,9.5,8.77705,0,-3.63565],
// 4 16 6.71745 0 -6.71745 3.1 0 -5.7 3.1 0 -7.2 3.63565 0 -8.77705
  [4,16,6.71745,0,-6.71745,3.1,0,-5.7,3.1,0,-7.2,3.63565,0,-8.77705],
// 4 16 8.77705 0 -3.63565 3.2 0 9.5 3.1 0 -5.7 6.71745 0 -6.71745
  [4,16,8.77705,0,-3.63565,3.2,0,9.5,3.1,0,-5.7,6.71745,0,-6.71745],
// 3 16 -10 0 10 -3.2 0 9.5 -1.3 0 9.5
  [3,16,-10,0,10,-3.2,0,9.5,-1.3,0,9.5],
// 3 16 10 0 10 1.3 0 9.5 3.2 0 9.5
  [3,16,10,0,10,1.3,0,9.5,3.2,0,9.5],
// 4 16 -10 0 10 -1.3 0 9.5 1.3 0 9.5 10 0 10
  [4,16,-10,0,10,-1.3,0,9.5,1.3,0,9.5,10,0,10],
];
module ldraw_lib__24246p02(step=0, col=false, unit=2/5, alt=false, line=0.2, solid=!$preview)
    makepoly(ldraw_lib__24246p02(), step=step, col=col, unit=unit, alt=alt, line=line, solid=solid);
ldraw_lib__24246p02(line=0.2);
